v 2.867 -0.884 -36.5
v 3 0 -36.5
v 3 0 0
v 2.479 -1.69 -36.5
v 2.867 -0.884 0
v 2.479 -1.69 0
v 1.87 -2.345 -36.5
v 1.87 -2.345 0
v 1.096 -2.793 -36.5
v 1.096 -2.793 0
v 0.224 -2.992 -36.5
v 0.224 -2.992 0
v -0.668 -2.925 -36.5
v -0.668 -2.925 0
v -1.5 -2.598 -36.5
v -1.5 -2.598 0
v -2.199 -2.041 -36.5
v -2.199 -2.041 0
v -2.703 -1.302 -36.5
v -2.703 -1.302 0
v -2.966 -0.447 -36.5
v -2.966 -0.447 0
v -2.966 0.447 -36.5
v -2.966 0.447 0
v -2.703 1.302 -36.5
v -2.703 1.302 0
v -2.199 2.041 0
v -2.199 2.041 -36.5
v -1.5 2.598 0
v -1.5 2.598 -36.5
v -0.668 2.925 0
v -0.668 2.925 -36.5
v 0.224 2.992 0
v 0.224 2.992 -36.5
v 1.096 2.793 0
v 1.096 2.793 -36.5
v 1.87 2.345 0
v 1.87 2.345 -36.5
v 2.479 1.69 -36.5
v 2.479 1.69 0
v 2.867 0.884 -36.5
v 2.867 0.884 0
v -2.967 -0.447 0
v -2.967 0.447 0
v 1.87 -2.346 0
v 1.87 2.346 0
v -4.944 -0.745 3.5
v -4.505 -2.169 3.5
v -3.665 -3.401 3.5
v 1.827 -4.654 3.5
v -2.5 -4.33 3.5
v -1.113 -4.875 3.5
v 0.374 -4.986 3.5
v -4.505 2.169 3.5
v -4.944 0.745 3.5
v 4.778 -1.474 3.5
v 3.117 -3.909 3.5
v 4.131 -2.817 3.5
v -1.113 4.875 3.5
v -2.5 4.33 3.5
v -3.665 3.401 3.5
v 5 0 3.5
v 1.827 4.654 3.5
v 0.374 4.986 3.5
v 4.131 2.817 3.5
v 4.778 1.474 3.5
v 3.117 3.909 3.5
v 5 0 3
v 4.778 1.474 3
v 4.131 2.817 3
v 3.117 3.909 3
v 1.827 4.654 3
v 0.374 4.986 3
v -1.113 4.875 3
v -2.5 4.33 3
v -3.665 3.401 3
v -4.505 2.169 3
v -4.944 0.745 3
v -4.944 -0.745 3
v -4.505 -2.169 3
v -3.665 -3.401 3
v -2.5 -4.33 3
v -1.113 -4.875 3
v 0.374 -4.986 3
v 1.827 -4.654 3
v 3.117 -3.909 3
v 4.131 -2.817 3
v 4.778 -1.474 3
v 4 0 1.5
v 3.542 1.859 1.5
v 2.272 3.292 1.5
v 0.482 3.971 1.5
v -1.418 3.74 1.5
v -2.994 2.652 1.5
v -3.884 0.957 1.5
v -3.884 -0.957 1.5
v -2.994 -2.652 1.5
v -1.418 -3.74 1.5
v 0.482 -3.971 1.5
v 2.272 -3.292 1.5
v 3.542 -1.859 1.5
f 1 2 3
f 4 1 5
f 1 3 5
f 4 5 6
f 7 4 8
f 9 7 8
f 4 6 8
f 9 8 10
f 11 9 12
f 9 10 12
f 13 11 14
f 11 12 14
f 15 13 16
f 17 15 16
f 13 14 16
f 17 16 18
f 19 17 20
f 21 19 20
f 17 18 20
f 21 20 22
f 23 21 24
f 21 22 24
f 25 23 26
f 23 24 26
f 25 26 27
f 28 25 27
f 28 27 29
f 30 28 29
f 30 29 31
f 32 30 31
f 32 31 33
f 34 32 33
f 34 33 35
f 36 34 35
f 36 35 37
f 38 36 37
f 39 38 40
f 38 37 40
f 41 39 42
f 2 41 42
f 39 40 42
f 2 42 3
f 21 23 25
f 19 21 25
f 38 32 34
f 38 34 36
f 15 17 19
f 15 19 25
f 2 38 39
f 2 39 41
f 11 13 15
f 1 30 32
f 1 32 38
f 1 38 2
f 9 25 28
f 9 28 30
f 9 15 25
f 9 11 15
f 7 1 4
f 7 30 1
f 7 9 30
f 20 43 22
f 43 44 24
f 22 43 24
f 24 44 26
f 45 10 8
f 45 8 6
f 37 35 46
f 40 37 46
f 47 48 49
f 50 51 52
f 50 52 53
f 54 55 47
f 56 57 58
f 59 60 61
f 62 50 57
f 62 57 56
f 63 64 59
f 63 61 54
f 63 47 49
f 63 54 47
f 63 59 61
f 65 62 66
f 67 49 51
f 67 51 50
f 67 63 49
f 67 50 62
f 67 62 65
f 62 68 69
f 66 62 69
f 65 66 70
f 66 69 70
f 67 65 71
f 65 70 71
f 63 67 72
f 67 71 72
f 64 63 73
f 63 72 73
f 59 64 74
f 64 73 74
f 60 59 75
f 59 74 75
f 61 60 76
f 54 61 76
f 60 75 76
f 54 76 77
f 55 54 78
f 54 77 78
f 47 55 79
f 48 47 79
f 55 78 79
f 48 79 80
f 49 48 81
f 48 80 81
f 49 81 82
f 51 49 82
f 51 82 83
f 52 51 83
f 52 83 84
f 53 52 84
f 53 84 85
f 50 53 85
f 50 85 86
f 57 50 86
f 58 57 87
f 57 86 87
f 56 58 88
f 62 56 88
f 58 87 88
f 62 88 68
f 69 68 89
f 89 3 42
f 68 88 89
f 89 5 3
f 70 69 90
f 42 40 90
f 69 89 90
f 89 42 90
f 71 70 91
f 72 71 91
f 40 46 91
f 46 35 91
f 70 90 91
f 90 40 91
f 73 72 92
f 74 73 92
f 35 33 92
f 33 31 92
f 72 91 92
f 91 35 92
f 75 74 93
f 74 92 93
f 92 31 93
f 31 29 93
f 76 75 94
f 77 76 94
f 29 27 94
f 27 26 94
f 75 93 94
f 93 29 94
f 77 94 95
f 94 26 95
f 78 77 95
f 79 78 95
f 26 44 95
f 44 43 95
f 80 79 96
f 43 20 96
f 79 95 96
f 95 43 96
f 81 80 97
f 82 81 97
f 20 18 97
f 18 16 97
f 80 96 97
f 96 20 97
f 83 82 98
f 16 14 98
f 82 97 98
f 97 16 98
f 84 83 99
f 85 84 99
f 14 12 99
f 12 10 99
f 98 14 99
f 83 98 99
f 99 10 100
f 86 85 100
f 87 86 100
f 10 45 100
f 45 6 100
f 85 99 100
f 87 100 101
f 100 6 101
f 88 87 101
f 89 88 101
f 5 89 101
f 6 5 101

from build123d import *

# Parameters (mm, degrees)
F0_R     = 5
F1_DEPTH = 3.5
F2_R     = 3
F3_DEPTH = 36.5
F4_SIZE2 = 1.99999
F4_SIZE  = 2.99999


# Not quite as in the source:
# - a fillet or chamfer is up to 0.001 mm smaller than in the source, because OpenCascade refuses the exact size


with BuildPart() as f1:
    # F0 (on Top) → F1 (new body)
    with BuildSketch(Plane.XY):
        Circle(F0_R)
    extrude(amount=F1_DEPTH)

    # F2 (on face) → F3 (join)
    with BuildSketch(Plane(origin=(0, 0, 0), x_dir=(1, 0, 0), z_dir=(0, 0, -1))):
        Circle(F2_R)
    extrude(amount=F3_DEPTH)

    # F4 (size 3 and 2 in the source; OpenCascade refuses exactly that, so slightly less here)
    f4_edges = [f1.edges().sort_by_distance(p)[0] for p in [
        (-5, 0, 0),
    ]]
    f4_side = f1.faces().sort_by_distance((-5, 0, 1.75))[0]
    chamfer(f4_edges, length=F4_SIZE, length2=F4_SIZE2, reference=f4_side)


solid = f1.part
